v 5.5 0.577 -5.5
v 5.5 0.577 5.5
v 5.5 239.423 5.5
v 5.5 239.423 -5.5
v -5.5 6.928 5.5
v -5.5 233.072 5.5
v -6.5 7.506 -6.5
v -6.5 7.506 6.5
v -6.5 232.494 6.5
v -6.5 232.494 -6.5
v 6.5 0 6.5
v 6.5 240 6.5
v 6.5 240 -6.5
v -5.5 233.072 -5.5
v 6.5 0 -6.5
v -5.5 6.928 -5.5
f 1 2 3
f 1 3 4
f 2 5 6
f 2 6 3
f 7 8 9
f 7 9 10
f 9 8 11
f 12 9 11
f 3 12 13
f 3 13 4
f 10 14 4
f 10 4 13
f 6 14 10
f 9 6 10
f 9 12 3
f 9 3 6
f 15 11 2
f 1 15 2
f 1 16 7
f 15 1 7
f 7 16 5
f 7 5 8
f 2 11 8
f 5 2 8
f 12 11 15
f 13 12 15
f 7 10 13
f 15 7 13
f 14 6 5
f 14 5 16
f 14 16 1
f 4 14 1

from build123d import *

# Parameters (mm, degrees)
SKETCH2_W               = 13
SKETCH2_H               = 13
SKETCH2_W_2             = 11
SKETCH2_H_2             = 11
BOSS_EXTRUDE1_DEPTH     = 240
CUT_EXTRUDE1_DEPTH      = 1
CUT_EXTRUDE1_DEPTH_BACK = 14
SKETCH4_OUTSIDE_W       = 63.14
SKETCH4_OUTSIDE_H       = 290.14
CUT_EXTRUDE2_DEPTH      = 240


with BuildPart() as part:
    # Sketch2 → Boss-Extrude1 (new body)
    with BuildSketch(Plane(origin=(0, 0, 0), x_dir=(1, 0, 0), z_dir=(0, 1, 0))):
        Rectangle(SKETCH2_W, SKETCH2_H)
        Rectangle(SKETCH2_W_2, SKETCH2_H_2, mode=Mode.SUBTRACT)
    extrude(amount=BOSS_EXTRUDE1_DEPTH)

    # Sketch3 → Cut-Extrude1 (cut, two sides)
    with BuildSketch(Plane.XY.offset(6.5)) as cut_extrude1_sk:
        Polygon((431.461827419, 485.351825456), (6.5, 240), (-6.5, 232.494446501), (-431.461827419, -12.857378955), (-922.165478331, 837.066275884), (-59.241823492, 1335.275480295), align=None)
    extrude(amount=CUT_EXTRUDE1_DEPTH, mode=Mode.SUBTRACT)
    extrude(cut_extrude1_sk.sketch, amount=-CUT_EXTRUDE1_DEPTH_BACK, mode=Mode.SUBTRACT)

    # Sketch4 outside → Cut-Extrude2 (cut)
    with BuildSketch(Plane.XY.offset(6.5)):
        with Locations((0, 120)):
            Rectangle(SKETCH4_OUTSIDE_W, SKETCH4_OUTSIDE_H)
        Polygon((6.5, 0), (-6.5, 7.505553499), (-6.5, 232.494446501), (6.5, 240), align=None, mode=Mode.SUBTRACT)
    extrude(amount=-CUT_EXTRUDE2_DEPTH, mode=Mode.SUBTRACT)


solid = part.part
